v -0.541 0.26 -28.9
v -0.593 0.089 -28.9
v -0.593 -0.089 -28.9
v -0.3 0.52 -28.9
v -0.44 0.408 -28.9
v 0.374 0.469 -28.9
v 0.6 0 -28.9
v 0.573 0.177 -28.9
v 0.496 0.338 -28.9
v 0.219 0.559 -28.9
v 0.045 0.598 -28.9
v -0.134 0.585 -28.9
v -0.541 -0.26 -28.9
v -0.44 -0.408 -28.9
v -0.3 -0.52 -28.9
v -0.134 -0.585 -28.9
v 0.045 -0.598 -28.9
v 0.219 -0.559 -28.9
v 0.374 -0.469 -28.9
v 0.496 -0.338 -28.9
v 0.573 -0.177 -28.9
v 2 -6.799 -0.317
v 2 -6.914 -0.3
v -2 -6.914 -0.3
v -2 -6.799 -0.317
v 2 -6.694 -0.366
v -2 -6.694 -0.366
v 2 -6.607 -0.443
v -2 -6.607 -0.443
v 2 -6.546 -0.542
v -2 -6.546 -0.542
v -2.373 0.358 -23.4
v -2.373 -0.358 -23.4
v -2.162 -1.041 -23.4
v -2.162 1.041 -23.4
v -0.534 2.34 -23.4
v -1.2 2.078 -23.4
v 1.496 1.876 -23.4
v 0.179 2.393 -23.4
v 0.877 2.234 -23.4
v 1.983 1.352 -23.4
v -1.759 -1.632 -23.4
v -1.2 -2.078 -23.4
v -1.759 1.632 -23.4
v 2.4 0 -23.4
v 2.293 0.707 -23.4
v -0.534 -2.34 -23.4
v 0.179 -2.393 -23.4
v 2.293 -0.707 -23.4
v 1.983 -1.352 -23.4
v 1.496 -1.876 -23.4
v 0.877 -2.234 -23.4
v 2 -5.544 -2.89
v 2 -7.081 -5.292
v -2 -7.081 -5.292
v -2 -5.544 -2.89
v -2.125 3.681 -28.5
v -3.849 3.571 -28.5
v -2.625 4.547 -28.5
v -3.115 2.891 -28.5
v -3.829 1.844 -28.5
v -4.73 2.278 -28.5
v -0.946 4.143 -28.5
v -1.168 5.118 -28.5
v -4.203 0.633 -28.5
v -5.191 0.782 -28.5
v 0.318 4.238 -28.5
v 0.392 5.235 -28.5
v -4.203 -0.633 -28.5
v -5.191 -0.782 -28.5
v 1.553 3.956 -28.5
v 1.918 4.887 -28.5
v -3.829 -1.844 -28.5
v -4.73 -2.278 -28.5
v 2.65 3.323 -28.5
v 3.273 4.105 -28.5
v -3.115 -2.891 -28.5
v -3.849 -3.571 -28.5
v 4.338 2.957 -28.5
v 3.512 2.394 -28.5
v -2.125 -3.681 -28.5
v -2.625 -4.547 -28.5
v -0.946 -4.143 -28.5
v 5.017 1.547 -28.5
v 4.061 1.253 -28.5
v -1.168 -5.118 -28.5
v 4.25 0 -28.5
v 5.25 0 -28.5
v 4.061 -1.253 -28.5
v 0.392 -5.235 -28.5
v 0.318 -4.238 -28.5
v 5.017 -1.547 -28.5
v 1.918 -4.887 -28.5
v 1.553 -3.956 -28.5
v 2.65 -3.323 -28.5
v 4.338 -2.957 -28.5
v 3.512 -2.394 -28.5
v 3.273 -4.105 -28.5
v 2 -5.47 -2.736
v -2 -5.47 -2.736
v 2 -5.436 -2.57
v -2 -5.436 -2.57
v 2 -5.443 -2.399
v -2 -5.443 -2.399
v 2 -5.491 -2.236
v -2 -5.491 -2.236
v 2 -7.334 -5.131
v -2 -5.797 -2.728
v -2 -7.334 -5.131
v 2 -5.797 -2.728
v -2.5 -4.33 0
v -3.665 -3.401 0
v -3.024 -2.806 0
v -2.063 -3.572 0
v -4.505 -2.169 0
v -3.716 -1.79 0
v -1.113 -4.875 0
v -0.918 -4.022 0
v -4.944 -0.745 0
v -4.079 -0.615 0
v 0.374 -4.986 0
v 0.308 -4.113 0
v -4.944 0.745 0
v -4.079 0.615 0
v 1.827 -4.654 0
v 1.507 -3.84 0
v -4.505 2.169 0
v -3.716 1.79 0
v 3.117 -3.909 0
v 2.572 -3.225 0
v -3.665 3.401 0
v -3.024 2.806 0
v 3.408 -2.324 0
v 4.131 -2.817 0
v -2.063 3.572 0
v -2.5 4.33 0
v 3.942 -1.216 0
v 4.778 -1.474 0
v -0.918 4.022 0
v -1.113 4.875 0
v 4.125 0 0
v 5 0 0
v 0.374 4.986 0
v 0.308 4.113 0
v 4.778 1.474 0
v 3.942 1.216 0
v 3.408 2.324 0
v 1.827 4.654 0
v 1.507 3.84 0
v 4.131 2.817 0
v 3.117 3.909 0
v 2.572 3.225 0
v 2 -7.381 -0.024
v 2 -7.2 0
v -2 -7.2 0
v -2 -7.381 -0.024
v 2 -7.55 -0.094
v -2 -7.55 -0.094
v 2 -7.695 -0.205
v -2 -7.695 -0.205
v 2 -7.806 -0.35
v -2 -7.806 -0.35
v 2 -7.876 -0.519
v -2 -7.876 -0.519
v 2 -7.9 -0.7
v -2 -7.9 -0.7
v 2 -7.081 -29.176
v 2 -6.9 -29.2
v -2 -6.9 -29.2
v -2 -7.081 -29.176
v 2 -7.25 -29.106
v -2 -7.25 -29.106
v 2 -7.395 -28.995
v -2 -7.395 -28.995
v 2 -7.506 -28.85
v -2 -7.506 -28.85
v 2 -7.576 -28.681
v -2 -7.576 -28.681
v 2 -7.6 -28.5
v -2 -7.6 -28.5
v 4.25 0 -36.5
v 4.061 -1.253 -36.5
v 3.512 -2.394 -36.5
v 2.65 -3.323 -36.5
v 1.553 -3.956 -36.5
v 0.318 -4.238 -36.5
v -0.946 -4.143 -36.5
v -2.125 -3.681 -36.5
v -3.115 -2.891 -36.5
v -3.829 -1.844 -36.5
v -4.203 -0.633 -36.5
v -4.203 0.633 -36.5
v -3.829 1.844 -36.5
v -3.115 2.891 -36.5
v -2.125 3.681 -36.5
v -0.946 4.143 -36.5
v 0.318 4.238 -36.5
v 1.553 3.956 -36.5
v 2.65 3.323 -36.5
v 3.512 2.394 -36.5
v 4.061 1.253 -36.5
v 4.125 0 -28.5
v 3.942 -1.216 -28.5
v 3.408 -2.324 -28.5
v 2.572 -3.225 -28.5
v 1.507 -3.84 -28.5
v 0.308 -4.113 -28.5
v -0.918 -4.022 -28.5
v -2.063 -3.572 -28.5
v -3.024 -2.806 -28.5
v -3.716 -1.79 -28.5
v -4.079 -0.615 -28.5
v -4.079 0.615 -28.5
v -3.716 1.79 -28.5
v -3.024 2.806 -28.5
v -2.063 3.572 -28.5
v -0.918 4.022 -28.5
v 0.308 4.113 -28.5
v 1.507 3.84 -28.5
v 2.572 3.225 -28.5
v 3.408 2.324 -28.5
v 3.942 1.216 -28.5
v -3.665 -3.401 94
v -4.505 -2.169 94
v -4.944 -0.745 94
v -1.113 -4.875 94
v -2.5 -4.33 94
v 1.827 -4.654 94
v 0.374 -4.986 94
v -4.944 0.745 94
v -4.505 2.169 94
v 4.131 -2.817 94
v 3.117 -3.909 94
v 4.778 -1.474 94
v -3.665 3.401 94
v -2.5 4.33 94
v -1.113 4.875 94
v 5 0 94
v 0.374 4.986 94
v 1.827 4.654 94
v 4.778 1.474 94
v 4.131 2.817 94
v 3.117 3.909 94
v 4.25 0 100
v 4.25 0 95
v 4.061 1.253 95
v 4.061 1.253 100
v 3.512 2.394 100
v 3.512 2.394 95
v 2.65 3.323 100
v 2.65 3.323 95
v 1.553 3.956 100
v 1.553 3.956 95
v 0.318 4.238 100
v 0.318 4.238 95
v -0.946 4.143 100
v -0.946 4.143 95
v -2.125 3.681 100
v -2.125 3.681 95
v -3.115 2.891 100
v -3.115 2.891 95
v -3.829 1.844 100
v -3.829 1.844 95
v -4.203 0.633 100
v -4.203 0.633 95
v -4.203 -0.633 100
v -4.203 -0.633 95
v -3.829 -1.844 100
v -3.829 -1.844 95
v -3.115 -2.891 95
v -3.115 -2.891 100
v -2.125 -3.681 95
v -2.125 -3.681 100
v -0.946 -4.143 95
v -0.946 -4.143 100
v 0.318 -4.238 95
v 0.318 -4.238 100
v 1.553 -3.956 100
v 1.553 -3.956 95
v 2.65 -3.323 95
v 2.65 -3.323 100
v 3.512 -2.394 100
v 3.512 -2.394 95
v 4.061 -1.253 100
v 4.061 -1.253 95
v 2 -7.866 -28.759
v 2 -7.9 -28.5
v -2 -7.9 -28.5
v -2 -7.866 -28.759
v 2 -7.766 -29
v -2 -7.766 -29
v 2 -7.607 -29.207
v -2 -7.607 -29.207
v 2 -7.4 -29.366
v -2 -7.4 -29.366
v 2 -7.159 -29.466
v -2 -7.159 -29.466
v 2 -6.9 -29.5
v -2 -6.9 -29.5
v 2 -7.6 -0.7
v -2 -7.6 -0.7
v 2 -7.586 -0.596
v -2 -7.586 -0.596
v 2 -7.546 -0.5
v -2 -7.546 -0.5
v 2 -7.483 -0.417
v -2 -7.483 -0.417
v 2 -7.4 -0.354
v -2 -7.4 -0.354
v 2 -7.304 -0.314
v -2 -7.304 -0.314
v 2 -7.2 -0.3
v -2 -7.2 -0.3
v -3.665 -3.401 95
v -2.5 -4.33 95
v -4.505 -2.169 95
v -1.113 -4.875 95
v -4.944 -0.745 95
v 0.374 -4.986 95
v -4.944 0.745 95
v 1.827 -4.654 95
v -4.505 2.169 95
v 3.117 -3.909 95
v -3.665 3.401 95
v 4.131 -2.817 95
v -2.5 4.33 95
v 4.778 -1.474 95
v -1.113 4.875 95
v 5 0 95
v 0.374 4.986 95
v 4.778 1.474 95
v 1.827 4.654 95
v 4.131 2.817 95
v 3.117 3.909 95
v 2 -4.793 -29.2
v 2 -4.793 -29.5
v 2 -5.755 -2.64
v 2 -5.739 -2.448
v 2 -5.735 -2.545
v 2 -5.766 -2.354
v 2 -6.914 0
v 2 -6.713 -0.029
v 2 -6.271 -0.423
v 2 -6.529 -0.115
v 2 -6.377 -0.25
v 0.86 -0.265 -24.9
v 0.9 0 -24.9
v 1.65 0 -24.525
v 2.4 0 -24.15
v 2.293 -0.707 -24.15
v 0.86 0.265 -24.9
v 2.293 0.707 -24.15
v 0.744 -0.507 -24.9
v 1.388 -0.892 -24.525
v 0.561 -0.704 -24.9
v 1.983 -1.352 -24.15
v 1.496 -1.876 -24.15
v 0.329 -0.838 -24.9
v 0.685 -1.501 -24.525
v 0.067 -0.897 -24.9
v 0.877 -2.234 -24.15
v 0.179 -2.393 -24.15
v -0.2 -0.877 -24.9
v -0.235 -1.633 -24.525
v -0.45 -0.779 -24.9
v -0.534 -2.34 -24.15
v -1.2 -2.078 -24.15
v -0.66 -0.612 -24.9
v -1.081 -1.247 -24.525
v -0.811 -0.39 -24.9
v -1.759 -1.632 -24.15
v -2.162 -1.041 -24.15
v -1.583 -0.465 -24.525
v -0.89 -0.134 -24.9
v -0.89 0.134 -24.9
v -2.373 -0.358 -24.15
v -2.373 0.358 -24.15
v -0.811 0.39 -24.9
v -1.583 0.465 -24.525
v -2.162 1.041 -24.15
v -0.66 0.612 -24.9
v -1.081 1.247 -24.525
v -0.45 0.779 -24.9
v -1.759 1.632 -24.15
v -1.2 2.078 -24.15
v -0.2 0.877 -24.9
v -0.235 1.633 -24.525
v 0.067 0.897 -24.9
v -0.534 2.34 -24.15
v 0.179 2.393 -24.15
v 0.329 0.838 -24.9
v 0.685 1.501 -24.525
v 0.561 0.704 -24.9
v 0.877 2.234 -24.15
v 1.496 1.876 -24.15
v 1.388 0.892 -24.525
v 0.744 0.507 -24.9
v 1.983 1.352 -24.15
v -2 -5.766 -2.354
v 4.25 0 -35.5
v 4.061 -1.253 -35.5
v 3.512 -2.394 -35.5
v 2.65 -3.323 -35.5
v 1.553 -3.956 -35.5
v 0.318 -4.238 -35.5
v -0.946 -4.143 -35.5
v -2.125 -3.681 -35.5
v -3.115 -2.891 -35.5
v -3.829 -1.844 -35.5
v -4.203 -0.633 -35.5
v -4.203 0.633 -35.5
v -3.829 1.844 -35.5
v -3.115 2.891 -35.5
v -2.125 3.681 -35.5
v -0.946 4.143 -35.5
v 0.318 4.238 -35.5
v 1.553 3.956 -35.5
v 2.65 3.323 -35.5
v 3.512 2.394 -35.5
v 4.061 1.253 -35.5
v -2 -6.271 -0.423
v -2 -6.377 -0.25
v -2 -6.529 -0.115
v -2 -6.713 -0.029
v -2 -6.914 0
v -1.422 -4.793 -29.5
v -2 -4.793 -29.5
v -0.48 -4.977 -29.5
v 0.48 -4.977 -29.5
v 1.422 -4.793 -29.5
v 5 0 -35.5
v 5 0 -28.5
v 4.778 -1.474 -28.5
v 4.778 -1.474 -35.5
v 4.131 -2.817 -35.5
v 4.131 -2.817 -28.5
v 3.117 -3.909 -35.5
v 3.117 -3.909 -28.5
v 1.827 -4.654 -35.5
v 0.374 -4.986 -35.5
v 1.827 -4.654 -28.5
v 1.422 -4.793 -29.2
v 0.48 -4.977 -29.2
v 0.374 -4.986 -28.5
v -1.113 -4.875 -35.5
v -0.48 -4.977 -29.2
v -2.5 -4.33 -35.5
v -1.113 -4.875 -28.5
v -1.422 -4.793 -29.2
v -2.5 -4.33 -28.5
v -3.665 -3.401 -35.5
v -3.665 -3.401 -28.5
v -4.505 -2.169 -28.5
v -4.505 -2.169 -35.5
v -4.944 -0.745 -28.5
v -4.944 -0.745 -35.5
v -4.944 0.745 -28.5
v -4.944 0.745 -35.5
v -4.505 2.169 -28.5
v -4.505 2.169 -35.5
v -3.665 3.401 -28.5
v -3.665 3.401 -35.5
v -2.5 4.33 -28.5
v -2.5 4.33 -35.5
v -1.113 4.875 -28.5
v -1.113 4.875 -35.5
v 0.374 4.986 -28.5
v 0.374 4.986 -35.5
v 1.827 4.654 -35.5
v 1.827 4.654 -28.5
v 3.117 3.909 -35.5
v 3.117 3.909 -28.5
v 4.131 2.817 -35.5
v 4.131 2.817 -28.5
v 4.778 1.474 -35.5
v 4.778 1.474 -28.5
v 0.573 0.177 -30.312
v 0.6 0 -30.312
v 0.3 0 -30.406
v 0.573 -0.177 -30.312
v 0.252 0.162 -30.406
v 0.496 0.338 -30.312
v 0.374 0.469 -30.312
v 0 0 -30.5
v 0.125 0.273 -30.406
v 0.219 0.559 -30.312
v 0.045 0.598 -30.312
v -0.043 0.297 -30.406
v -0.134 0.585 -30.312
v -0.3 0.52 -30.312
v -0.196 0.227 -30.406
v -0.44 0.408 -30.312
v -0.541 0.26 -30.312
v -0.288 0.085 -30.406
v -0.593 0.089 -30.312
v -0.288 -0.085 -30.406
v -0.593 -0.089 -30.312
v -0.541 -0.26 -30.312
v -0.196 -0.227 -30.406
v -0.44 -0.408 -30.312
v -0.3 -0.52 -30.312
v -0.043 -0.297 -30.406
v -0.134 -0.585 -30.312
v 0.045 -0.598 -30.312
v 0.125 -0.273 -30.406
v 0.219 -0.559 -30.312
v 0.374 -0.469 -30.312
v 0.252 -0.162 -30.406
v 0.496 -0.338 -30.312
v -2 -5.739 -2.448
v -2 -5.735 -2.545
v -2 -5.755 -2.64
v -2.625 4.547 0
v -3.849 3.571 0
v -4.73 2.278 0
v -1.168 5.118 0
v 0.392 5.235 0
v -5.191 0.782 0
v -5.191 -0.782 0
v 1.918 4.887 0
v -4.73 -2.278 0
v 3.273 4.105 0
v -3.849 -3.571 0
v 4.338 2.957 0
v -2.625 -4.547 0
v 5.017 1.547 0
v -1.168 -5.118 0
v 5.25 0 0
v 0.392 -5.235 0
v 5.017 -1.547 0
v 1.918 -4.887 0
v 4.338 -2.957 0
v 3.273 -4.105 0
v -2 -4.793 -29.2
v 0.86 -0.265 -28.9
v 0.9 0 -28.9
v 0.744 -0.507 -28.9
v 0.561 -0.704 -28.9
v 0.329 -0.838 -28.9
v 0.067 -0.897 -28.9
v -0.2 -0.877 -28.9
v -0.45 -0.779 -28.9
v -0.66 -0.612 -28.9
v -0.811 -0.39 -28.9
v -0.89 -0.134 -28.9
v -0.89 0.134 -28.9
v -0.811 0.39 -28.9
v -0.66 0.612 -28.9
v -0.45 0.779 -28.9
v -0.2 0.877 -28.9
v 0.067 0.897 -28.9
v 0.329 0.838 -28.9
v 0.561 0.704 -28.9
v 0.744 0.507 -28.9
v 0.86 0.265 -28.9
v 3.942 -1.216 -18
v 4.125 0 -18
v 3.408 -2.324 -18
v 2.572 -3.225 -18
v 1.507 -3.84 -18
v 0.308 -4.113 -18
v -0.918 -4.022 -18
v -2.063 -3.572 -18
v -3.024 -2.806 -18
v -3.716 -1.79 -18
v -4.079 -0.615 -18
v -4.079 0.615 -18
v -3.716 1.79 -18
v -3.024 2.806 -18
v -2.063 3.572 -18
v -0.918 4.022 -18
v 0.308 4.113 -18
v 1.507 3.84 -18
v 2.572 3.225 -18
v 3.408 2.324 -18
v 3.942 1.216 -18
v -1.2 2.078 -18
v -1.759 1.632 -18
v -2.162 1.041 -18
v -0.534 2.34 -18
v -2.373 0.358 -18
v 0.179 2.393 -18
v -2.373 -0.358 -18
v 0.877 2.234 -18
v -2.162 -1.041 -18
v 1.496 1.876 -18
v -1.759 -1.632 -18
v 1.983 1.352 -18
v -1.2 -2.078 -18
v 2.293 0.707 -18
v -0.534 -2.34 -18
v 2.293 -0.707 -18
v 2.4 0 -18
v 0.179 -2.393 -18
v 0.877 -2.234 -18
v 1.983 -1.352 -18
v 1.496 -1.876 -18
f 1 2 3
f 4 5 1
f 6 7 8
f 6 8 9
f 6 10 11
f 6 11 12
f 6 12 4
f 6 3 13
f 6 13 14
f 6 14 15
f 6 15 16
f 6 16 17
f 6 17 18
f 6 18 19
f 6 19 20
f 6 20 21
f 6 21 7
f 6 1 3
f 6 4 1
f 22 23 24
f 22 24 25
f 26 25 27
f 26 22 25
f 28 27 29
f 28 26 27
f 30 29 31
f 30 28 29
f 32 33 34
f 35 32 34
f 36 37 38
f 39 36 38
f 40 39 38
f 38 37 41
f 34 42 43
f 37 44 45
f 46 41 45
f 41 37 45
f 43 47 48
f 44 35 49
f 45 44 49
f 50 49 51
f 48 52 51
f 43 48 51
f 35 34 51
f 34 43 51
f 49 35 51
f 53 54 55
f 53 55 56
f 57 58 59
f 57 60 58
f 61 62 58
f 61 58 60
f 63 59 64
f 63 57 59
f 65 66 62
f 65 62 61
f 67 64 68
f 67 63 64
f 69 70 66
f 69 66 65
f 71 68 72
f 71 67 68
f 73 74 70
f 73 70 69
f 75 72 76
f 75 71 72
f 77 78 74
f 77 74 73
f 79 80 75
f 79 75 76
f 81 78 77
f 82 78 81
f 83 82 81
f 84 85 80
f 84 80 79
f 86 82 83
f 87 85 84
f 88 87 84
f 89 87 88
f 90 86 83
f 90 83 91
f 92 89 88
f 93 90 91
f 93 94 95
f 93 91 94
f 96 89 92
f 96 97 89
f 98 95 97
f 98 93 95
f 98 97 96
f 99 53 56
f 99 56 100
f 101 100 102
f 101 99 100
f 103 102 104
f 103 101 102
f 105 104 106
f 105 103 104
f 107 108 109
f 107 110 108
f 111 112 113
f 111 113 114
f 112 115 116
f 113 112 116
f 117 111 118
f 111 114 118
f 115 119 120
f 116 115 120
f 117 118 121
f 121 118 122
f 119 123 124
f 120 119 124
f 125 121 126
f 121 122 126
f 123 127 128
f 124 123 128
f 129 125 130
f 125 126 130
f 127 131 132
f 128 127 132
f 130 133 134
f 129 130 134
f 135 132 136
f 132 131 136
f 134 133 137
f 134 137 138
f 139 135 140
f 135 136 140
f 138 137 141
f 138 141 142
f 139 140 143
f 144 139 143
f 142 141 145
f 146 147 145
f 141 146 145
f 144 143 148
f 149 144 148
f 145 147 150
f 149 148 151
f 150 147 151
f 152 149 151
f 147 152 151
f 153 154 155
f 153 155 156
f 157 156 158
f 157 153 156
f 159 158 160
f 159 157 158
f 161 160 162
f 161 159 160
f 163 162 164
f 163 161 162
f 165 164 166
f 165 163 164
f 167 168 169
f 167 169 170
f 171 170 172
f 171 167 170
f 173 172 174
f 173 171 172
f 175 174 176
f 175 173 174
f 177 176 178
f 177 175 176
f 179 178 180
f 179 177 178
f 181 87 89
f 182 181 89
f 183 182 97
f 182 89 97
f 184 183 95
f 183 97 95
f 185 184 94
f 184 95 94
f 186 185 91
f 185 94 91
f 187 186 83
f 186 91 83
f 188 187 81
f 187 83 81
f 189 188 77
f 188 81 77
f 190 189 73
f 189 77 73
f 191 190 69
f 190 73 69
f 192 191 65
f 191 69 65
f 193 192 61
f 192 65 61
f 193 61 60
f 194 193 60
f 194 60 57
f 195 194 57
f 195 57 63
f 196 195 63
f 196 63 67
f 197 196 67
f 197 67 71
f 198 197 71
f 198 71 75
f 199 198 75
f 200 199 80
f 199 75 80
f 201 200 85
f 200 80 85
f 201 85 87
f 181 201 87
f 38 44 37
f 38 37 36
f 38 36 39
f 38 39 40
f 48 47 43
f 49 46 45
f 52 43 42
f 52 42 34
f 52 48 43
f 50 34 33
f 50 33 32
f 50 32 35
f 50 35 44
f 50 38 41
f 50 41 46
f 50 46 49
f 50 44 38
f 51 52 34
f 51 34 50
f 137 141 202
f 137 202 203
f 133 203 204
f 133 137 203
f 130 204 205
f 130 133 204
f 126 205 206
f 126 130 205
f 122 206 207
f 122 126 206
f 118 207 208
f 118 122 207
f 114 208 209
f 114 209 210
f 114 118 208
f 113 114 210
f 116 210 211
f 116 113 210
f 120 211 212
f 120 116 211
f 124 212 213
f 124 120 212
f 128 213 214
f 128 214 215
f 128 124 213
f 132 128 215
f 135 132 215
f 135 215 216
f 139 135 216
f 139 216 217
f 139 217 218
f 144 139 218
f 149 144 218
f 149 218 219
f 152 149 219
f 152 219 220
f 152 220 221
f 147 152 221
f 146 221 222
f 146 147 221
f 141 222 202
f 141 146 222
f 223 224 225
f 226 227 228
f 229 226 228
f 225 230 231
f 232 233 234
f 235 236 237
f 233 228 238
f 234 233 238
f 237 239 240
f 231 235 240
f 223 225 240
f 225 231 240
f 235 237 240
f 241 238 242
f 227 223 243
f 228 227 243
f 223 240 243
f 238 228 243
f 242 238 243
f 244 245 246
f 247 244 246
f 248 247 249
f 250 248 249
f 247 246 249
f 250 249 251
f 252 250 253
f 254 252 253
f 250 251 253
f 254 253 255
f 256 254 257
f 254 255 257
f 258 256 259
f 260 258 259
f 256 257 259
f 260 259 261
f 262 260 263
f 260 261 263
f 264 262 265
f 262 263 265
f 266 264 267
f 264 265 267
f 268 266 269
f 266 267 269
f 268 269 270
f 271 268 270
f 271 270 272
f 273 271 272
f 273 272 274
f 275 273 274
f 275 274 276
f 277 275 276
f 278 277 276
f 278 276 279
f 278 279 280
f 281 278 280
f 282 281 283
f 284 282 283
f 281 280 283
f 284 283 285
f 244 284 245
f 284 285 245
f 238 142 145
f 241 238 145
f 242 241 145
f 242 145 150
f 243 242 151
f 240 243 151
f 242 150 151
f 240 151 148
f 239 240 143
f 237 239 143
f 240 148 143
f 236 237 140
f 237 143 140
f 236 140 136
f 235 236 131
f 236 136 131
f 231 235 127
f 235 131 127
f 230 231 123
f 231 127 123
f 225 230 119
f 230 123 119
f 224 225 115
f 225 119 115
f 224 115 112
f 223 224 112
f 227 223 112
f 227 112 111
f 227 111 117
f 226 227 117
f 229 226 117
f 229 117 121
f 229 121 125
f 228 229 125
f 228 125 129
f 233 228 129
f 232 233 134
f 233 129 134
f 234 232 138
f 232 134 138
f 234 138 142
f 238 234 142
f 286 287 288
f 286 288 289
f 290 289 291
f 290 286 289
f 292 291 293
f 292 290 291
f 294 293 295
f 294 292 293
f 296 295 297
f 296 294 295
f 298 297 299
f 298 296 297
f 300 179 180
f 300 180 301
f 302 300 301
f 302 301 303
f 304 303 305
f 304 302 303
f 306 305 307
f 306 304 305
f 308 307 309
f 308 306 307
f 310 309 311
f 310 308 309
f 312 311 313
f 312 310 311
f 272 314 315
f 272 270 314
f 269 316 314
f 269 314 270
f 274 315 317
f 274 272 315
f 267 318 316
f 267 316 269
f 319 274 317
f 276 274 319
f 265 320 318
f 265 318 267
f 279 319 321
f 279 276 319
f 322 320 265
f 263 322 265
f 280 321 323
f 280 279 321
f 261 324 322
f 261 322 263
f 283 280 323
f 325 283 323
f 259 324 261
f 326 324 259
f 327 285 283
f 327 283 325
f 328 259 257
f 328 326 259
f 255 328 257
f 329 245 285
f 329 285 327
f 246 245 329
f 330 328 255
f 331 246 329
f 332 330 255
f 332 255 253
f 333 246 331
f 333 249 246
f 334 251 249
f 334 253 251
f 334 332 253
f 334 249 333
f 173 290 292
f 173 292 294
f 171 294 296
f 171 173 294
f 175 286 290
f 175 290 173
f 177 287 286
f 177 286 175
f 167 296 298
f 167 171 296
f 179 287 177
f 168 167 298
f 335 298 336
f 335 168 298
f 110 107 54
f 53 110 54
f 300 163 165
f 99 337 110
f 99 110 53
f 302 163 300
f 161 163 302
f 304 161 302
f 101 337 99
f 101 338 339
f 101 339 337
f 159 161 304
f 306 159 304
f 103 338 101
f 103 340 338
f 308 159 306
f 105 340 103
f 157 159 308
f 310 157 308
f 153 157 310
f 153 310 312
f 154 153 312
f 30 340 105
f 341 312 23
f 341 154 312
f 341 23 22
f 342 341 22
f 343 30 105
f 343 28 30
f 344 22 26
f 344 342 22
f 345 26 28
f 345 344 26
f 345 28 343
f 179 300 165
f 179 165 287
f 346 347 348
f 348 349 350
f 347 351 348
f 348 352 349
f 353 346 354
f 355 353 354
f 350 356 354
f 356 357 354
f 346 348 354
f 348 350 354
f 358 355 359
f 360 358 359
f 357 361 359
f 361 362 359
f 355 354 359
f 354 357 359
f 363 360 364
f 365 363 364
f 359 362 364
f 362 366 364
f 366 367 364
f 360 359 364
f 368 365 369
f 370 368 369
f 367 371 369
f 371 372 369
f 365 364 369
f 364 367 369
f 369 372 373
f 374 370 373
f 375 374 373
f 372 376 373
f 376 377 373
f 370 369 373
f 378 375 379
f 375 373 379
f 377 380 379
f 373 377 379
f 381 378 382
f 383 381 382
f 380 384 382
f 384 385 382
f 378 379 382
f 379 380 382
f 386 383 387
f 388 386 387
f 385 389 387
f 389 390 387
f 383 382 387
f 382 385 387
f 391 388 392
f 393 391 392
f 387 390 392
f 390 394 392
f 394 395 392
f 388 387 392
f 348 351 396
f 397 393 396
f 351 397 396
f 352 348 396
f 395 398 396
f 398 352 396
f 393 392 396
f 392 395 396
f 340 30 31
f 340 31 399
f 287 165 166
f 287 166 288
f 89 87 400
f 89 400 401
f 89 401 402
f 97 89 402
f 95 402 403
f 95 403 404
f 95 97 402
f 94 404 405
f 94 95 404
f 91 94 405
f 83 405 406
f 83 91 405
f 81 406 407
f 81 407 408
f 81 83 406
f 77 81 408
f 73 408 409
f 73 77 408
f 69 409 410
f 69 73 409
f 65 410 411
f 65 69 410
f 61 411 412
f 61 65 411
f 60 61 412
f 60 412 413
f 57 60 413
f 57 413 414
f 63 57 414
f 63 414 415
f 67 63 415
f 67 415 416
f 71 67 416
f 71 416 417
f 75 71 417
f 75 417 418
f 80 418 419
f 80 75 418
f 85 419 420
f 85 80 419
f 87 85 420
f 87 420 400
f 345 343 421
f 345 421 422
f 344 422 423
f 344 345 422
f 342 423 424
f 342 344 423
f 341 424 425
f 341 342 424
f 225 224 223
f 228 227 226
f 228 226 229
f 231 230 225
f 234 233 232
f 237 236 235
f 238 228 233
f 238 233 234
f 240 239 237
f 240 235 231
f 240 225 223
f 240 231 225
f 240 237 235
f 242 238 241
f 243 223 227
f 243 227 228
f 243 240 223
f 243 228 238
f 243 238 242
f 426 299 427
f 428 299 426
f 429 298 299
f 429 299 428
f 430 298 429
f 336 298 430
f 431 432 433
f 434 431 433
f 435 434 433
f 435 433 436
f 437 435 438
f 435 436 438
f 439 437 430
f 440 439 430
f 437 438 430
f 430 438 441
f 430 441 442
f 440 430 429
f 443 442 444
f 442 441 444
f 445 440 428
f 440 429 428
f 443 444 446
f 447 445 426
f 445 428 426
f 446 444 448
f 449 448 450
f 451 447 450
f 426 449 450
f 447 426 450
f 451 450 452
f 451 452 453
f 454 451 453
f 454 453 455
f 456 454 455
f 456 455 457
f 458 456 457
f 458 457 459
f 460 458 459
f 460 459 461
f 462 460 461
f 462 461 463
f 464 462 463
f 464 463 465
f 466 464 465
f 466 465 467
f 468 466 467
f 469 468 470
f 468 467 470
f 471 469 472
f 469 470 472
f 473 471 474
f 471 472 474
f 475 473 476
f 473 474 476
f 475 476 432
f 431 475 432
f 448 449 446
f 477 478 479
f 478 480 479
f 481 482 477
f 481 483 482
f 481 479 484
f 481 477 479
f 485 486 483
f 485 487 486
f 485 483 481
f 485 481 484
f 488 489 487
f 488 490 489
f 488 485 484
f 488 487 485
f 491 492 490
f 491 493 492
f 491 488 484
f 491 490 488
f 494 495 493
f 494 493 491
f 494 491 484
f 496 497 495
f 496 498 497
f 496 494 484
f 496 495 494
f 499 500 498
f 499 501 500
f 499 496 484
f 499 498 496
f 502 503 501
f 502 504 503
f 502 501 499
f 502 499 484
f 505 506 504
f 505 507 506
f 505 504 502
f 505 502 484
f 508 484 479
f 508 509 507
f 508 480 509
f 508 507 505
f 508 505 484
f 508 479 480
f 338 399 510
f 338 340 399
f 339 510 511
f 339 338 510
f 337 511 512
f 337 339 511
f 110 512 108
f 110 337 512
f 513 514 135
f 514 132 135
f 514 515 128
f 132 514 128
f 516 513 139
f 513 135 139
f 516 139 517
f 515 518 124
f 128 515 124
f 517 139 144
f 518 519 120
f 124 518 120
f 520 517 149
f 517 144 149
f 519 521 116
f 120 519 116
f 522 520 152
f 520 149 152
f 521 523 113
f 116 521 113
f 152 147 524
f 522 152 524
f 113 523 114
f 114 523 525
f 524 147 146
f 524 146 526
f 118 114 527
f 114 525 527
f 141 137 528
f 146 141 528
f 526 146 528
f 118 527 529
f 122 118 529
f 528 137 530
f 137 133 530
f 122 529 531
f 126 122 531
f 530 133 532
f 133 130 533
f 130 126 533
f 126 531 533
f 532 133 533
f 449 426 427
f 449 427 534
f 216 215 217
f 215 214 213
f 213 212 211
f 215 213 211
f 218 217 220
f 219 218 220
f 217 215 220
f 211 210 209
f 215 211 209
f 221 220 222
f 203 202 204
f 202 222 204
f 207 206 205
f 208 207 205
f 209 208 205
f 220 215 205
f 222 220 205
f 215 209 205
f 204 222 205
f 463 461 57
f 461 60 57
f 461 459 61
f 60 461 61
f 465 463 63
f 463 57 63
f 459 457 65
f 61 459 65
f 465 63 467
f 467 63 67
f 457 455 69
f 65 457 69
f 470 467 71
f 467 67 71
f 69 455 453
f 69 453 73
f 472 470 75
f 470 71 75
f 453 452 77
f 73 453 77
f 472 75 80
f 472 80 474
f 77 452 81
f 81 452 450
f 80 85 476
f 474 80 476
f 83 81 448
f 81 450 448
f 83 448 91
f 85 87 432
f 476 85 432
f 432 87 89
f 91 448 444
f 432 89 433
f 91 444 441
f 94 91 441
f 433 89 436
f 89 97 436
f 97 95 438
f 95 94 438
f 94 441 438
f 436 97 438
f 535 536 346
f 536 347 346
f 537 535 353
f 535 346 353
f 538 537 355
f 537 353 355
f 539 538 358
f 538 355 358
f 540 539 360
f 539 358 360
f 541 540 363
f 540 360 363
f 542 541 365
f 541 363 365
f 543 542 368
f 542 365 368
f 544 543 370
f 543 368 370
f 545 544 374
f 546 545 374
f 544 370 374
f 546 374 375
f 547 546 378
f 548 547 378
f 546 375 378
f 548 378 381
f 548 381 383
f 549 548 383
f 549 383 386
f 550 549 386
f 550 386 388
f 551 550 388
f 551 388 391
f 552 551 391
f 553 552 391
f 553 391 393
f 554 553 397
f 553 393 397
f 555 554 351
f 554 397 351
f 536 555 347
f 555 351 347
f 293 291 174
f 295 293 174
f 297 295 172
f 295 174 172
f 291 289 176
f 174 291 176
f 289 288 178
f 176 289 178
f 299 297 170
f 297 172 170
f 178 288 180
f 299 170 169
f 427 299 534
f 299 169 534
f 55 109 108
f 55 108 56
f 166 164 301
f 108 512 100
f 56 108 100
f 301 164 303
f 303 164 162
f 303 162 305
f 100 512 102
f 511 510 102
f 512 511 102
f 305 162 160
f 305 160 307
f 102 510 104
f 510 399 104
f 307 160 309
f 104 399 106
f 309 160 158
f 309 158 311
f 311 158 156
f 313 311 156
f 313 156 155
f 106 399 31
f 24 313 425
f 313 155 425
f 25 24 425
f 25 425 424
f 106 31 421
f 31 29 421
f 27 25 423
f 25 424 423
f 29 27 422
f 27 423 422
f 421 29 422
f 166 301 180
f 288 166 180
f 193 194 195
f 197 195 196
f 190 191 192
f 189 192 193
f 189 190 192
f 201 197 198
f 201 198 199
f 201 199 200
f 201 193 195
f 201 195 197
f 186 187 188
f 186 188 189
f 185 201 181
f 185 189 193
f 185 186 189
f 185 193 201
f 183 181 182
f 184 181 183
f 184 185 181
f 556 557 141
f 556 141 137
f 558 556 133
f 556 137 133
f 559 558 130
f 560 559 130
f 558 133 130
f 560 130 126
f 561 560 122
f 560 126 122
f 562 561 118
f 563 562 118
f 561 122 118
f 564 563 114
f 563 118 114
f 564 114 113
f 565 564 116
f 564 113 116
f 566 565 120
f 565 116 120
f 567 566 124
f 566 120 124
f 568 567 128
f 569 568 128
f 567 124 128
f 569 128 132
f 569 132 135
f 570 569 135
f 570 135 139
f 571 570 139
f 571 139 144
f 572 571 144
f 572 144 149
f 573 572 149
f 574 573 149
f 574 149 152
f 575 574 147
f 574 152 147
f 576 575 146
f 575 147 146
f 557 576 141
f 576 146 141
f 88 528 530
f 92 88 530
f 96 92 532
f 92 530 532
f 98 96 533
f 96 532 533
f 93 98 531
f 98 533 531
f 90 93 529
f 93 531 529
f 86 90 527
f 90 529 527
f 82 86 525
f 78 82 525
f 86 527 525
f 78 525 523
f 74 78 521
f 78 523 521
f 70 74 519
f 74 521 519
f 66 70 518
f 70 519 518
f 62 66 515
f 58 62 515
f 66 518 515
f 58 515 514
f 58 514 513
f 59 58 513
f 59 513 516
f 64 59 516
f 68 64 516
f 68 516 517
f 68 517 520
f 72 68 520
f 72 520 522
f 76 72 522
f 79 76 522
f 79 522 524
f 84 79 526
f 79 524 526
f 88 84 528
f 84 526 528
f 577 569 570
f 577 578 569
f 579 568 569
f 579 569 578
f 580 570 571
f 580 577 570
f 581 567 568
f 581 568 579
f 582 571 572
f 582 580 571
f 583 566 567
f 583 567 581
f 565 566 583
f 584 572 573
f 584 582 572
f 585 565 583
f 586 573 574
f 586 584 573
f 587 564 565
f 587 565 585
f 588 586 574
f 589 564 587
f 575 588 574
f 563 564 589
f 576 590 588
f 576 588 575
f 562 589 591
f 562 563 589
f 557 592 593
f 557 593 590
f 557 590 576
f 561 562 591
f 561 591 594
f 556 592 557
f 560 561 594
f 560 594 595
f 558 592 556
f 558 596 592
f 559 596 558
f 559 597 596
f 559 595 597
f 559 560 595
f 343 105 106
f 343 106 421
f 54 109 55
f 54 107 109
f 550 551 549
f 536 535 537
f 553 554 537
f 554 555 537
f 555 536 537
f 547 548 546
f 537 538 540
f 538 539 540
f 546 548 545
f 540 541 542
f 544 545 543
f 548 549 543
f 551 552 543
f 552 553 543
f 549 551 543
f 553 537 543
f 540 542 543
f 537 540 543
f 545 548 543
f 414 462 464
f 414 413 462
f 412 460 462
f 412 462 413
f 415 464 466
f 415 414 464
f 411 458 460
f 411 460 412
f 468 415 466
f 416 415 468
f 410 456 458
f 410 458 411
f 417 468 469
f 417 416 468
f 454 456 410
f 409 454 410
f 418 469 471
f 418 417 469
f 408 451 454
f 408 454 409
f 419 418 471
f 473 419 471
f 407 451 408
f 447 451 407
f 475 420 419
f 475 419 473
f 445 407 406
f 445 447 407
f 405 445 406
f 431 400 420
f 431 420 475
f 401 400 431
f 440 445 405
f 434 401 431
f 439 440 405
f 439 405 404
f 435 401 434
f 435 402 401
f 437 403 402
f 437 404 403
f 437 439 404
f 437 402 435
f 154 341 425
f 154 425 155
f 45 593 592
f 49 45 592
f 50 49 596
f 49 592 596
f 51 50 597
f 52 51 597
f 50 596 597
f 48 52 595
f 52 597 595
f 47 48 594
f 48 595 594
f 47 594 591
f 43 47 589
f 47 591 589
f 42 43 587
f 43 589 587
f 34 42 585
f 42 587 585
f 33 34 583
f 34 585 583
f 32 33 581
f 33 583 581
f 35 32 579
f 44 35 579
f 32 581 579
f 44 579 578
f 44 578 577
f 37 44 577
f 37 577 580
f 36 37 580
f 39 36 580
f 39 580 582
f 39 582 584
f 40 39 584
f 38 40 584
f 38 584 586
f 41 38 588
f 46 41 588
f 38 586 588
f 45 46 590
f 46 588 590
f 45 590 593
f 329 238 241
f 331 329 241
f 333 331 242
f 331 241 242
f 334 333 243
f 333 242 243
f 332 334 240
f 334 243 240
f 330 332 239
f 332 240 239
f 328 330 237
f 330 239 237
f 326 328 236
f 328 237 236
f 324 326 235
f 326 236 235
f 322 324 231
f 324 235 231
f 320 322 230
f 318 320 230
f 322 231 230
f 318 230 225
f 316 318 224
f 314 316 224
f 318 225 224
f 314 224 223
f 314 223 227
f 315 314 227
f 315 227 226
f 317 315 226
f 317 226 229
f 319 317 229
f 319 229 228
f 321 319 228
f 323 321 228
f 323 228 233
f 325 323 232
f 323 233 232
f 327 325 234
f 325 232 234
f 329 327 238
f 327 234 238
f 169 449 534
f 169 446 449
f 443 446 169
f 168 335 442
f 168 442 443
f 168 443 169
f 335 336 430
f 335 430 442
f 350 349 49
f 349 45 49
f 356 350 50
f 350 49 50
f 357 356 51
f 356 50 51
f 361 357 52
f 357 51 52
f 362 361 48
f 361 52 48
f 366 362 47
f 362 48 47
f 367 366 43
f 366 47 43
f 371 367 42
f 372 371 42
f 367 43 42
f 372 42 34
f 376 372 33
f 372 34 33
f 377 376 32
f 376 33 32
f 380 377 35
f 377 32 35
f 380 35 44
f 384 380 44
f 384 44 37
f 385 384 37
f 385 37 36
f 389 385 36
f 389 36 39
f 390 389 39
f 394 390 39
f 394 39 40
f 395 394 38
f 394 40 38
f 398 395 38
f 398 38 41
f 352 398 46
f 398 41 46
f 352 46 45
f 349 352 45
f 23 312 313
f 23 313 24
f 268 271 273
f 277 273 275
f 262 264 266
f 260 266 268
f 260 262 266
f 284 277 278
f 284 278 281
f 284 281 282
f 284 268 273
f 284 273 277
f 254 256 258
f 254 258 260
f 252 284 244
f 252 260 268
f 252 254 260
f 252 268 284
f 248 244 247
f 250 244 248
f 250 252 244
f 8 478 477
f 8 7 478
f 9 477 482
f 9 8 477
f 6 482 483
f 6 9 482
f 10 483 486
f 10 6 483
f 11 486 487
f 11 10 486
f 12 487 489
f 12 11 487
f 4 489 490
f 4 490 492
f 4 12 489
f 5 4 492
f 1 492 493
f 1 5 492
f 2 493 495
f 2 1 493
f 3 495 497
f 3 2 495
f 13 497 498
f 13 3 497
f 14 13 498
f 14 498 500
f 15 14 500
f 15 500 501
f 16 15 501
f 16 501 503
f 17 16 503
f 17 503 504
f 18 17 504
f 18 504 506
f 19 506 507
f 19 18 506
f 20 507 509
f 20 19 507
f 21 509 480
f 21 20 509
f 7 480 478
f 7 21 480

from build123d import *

# Parameters (mm, degrees)
F0_R      = 5
F1_DEPTH  = 94
F2_R      = 5
F3_DEPTH  = 1
F4_R      = 4.125
F5_DEPTH  = 18
F6_R      = 2.4
F7_DEPTH  = 5.4
F10_R     = 4.25
F11_DEPTH = 5
F14_R     = 5.25
F14_R_2   = 4.125
F15_DEPTH = 28.5
F16_R     = 4.25
F17_DEPTH = 8
F18_R     = 5
F18_R_2   = 4.25
F19_DEPTH = 7
F21_DEPTH = 2


with BuildPart() as f1:
    # F0 (on Top) → F1 (new body)
    with BuildSketch(Plane.XY):
        Circle(F0_R)
    extrude(amount=F1_DEPTH)

    # F4 (on face) → F5 (join)
    with BuildSketch(Plane(origin=(0, 0, 0), x_dir=(1, 0, 0), z_dir=(0, 0, -1))):
        Circle(F4_R)
    extrude(amount=F5_DEPTH)

    # F6 (on face) → F7 (join)
    with BuildSketch(Plane(origin=(0, 0, -18), x_dir=(1, 0, 0), z_dir=(0, 0, -1))):
        Circle(F6_R)
    extrude(amount=F7_DEPTH)


with BuildPart() as f3:
    # F2 (on face) → F3 (new body)
    with BuildSketch(Plane.XY.offset(94)):
        Circle(F2_R)
    extrude(amount=F3_DEPTH)

    # F10 (on face) → F11 (join)
    with BuildSketch(Plane.XY.offset(95)):
        Circle(F10_R)
    extrude(amount=F11_DEPTH)


with BuildPart() as f9:
    # F8 (on Front) → F9 (revolve)
    with BuildSketch(Plane.XZ):
        Polygon((2.4, -24.15), (2.4, -23.4), (0, -23.4), (0, -28.9), (0.9, -28.9), (0.9, -24.9), align=None)
    revolve(axis=Axis((0, 0, -26.15), (0, 0, -1)))


with BuildPart() as f13:
    # F12 (on Front) → F13 (revolve)
    with BuildSketch(Plane.XZ):
        Polygon((0.6, -28.9), (0, -28.9), (0, -30.5), (0.6, -30.3116552532), align=None)
    revolve(axis=Axis((0, 0, -29.7), (0, 0, 1)))


with BuildPart() as f15:
    # F14 (on face) → F15 (new body)
    with BuildSketch(Plane(origin=(0, 0, 0), x_dir=(1, 0, 0), z_dir=(0, 0, -1))):
        Circle(F14_R)
        Circle(F14_R_2, mode=Mode.SUBTRACT)
    extrude(amount=F15_DEPTH)

    # F16 (on face) → F17 (join)
    with BuildSketch(Plane(origin=(0, 0, -28.5), x_dir=(1, 0, 0), z_dir=(0, 0, -1))):
        Circle(F16_R)
    extrude(amount=F17_DEPTH)


with BuildPart() as f19:
    # F18 (on face) → F19 (new body)
    with BuildSketch(Plane(origin=(0, 0, -28.5), x_dir=(1, 0, 0), z_dir=(0, 0, -1))):
        Circle(F18_R)
        Circle(F18_R_2, mode=Mode.SUBTRACT)
    extrude(amount=F19_DEPTH)

    # F20 (on Right) → F21 (join, symmetric)
    with BuildSketch(Plane.YZ):
        with BuildLine():
            Line((-7.3335008867, -5.1305089463), (-7.0807887241, -5.2921772003))
            Line((-7.0807887241, -5.2921772003), (-5.5439237256, -2.8898225776))
            ThreePointArc((-5.5439237256, -2.8898225776), (-5.4359020791, -2.5695020632), (-5.4905885572, -2.2359105506))
            Line((-5.4905885572, -2.2359105506), (-6.2705623658, -0.4233137702))
            ThreePointArc((-6.2705623658, -0.4233137702), (-6.5286437049, -0.1153289981), (-6.9135590456, 0))
            Line((-6.9135590456, 0), (-7.2, 0))
            ThreePointArc((-7.2, 0), (-7.6949747468, -0.2050252532), (-7.9, -0.7))
            Line((-7.9, -0.7), (-7.9, -28.5))
            ThreePointArc((-7.9, -28.5), (-7.6071067812, -29.2071067812), (-6.9, -29.5))
            Line((-6.9, -29.5), (-4.7933913732, -29.5))
            Line((-4.7933913732, -29.5), (-4.7933913732, -29.1999998975))
            Line((-4.7933913732, -29.1999998975), (-6.9, -29.1999998975))
            ThreePointArc((-6.9, -29.1999998975), (-7.3949746744, -28.9949746744), (-7.5999998975, -28.5))
            Line((-7.5999998975, -28.5), (-7.5999998975, -0.7))
            ThreePointArc((-7.5999998975, -0.7), (-7.48284264, -0.41715736), (-7.2, -0.3000001025))
            Line((-7.2, -0.3000001025), (-6.9135590456, -0.3000001025))
            ThreePointArc((-6.9135590456, -0.3000001025), (-6.6936074787, -0.3659023702), (-6.5461324656, -0.5418936235))
            Line((-6.5461324656, -0.5418936235), (-5.7661586569, -2.3544904039))
            ThreePointArc((-5.7661586569, -2.3544904039), (-5.7349092489, -2.5451140765), (-5.7966358882, -2.7281543236))
            Line((-5.7966358882, -2.7281543236), (-7.3335008867, -5.1305089463))
        make_face()
    extrude(amount=F21_DEPTH, both=True)


solid = Compound([f1.part, f3.part, f9.part, f13.part, f15.part, f19.part])
